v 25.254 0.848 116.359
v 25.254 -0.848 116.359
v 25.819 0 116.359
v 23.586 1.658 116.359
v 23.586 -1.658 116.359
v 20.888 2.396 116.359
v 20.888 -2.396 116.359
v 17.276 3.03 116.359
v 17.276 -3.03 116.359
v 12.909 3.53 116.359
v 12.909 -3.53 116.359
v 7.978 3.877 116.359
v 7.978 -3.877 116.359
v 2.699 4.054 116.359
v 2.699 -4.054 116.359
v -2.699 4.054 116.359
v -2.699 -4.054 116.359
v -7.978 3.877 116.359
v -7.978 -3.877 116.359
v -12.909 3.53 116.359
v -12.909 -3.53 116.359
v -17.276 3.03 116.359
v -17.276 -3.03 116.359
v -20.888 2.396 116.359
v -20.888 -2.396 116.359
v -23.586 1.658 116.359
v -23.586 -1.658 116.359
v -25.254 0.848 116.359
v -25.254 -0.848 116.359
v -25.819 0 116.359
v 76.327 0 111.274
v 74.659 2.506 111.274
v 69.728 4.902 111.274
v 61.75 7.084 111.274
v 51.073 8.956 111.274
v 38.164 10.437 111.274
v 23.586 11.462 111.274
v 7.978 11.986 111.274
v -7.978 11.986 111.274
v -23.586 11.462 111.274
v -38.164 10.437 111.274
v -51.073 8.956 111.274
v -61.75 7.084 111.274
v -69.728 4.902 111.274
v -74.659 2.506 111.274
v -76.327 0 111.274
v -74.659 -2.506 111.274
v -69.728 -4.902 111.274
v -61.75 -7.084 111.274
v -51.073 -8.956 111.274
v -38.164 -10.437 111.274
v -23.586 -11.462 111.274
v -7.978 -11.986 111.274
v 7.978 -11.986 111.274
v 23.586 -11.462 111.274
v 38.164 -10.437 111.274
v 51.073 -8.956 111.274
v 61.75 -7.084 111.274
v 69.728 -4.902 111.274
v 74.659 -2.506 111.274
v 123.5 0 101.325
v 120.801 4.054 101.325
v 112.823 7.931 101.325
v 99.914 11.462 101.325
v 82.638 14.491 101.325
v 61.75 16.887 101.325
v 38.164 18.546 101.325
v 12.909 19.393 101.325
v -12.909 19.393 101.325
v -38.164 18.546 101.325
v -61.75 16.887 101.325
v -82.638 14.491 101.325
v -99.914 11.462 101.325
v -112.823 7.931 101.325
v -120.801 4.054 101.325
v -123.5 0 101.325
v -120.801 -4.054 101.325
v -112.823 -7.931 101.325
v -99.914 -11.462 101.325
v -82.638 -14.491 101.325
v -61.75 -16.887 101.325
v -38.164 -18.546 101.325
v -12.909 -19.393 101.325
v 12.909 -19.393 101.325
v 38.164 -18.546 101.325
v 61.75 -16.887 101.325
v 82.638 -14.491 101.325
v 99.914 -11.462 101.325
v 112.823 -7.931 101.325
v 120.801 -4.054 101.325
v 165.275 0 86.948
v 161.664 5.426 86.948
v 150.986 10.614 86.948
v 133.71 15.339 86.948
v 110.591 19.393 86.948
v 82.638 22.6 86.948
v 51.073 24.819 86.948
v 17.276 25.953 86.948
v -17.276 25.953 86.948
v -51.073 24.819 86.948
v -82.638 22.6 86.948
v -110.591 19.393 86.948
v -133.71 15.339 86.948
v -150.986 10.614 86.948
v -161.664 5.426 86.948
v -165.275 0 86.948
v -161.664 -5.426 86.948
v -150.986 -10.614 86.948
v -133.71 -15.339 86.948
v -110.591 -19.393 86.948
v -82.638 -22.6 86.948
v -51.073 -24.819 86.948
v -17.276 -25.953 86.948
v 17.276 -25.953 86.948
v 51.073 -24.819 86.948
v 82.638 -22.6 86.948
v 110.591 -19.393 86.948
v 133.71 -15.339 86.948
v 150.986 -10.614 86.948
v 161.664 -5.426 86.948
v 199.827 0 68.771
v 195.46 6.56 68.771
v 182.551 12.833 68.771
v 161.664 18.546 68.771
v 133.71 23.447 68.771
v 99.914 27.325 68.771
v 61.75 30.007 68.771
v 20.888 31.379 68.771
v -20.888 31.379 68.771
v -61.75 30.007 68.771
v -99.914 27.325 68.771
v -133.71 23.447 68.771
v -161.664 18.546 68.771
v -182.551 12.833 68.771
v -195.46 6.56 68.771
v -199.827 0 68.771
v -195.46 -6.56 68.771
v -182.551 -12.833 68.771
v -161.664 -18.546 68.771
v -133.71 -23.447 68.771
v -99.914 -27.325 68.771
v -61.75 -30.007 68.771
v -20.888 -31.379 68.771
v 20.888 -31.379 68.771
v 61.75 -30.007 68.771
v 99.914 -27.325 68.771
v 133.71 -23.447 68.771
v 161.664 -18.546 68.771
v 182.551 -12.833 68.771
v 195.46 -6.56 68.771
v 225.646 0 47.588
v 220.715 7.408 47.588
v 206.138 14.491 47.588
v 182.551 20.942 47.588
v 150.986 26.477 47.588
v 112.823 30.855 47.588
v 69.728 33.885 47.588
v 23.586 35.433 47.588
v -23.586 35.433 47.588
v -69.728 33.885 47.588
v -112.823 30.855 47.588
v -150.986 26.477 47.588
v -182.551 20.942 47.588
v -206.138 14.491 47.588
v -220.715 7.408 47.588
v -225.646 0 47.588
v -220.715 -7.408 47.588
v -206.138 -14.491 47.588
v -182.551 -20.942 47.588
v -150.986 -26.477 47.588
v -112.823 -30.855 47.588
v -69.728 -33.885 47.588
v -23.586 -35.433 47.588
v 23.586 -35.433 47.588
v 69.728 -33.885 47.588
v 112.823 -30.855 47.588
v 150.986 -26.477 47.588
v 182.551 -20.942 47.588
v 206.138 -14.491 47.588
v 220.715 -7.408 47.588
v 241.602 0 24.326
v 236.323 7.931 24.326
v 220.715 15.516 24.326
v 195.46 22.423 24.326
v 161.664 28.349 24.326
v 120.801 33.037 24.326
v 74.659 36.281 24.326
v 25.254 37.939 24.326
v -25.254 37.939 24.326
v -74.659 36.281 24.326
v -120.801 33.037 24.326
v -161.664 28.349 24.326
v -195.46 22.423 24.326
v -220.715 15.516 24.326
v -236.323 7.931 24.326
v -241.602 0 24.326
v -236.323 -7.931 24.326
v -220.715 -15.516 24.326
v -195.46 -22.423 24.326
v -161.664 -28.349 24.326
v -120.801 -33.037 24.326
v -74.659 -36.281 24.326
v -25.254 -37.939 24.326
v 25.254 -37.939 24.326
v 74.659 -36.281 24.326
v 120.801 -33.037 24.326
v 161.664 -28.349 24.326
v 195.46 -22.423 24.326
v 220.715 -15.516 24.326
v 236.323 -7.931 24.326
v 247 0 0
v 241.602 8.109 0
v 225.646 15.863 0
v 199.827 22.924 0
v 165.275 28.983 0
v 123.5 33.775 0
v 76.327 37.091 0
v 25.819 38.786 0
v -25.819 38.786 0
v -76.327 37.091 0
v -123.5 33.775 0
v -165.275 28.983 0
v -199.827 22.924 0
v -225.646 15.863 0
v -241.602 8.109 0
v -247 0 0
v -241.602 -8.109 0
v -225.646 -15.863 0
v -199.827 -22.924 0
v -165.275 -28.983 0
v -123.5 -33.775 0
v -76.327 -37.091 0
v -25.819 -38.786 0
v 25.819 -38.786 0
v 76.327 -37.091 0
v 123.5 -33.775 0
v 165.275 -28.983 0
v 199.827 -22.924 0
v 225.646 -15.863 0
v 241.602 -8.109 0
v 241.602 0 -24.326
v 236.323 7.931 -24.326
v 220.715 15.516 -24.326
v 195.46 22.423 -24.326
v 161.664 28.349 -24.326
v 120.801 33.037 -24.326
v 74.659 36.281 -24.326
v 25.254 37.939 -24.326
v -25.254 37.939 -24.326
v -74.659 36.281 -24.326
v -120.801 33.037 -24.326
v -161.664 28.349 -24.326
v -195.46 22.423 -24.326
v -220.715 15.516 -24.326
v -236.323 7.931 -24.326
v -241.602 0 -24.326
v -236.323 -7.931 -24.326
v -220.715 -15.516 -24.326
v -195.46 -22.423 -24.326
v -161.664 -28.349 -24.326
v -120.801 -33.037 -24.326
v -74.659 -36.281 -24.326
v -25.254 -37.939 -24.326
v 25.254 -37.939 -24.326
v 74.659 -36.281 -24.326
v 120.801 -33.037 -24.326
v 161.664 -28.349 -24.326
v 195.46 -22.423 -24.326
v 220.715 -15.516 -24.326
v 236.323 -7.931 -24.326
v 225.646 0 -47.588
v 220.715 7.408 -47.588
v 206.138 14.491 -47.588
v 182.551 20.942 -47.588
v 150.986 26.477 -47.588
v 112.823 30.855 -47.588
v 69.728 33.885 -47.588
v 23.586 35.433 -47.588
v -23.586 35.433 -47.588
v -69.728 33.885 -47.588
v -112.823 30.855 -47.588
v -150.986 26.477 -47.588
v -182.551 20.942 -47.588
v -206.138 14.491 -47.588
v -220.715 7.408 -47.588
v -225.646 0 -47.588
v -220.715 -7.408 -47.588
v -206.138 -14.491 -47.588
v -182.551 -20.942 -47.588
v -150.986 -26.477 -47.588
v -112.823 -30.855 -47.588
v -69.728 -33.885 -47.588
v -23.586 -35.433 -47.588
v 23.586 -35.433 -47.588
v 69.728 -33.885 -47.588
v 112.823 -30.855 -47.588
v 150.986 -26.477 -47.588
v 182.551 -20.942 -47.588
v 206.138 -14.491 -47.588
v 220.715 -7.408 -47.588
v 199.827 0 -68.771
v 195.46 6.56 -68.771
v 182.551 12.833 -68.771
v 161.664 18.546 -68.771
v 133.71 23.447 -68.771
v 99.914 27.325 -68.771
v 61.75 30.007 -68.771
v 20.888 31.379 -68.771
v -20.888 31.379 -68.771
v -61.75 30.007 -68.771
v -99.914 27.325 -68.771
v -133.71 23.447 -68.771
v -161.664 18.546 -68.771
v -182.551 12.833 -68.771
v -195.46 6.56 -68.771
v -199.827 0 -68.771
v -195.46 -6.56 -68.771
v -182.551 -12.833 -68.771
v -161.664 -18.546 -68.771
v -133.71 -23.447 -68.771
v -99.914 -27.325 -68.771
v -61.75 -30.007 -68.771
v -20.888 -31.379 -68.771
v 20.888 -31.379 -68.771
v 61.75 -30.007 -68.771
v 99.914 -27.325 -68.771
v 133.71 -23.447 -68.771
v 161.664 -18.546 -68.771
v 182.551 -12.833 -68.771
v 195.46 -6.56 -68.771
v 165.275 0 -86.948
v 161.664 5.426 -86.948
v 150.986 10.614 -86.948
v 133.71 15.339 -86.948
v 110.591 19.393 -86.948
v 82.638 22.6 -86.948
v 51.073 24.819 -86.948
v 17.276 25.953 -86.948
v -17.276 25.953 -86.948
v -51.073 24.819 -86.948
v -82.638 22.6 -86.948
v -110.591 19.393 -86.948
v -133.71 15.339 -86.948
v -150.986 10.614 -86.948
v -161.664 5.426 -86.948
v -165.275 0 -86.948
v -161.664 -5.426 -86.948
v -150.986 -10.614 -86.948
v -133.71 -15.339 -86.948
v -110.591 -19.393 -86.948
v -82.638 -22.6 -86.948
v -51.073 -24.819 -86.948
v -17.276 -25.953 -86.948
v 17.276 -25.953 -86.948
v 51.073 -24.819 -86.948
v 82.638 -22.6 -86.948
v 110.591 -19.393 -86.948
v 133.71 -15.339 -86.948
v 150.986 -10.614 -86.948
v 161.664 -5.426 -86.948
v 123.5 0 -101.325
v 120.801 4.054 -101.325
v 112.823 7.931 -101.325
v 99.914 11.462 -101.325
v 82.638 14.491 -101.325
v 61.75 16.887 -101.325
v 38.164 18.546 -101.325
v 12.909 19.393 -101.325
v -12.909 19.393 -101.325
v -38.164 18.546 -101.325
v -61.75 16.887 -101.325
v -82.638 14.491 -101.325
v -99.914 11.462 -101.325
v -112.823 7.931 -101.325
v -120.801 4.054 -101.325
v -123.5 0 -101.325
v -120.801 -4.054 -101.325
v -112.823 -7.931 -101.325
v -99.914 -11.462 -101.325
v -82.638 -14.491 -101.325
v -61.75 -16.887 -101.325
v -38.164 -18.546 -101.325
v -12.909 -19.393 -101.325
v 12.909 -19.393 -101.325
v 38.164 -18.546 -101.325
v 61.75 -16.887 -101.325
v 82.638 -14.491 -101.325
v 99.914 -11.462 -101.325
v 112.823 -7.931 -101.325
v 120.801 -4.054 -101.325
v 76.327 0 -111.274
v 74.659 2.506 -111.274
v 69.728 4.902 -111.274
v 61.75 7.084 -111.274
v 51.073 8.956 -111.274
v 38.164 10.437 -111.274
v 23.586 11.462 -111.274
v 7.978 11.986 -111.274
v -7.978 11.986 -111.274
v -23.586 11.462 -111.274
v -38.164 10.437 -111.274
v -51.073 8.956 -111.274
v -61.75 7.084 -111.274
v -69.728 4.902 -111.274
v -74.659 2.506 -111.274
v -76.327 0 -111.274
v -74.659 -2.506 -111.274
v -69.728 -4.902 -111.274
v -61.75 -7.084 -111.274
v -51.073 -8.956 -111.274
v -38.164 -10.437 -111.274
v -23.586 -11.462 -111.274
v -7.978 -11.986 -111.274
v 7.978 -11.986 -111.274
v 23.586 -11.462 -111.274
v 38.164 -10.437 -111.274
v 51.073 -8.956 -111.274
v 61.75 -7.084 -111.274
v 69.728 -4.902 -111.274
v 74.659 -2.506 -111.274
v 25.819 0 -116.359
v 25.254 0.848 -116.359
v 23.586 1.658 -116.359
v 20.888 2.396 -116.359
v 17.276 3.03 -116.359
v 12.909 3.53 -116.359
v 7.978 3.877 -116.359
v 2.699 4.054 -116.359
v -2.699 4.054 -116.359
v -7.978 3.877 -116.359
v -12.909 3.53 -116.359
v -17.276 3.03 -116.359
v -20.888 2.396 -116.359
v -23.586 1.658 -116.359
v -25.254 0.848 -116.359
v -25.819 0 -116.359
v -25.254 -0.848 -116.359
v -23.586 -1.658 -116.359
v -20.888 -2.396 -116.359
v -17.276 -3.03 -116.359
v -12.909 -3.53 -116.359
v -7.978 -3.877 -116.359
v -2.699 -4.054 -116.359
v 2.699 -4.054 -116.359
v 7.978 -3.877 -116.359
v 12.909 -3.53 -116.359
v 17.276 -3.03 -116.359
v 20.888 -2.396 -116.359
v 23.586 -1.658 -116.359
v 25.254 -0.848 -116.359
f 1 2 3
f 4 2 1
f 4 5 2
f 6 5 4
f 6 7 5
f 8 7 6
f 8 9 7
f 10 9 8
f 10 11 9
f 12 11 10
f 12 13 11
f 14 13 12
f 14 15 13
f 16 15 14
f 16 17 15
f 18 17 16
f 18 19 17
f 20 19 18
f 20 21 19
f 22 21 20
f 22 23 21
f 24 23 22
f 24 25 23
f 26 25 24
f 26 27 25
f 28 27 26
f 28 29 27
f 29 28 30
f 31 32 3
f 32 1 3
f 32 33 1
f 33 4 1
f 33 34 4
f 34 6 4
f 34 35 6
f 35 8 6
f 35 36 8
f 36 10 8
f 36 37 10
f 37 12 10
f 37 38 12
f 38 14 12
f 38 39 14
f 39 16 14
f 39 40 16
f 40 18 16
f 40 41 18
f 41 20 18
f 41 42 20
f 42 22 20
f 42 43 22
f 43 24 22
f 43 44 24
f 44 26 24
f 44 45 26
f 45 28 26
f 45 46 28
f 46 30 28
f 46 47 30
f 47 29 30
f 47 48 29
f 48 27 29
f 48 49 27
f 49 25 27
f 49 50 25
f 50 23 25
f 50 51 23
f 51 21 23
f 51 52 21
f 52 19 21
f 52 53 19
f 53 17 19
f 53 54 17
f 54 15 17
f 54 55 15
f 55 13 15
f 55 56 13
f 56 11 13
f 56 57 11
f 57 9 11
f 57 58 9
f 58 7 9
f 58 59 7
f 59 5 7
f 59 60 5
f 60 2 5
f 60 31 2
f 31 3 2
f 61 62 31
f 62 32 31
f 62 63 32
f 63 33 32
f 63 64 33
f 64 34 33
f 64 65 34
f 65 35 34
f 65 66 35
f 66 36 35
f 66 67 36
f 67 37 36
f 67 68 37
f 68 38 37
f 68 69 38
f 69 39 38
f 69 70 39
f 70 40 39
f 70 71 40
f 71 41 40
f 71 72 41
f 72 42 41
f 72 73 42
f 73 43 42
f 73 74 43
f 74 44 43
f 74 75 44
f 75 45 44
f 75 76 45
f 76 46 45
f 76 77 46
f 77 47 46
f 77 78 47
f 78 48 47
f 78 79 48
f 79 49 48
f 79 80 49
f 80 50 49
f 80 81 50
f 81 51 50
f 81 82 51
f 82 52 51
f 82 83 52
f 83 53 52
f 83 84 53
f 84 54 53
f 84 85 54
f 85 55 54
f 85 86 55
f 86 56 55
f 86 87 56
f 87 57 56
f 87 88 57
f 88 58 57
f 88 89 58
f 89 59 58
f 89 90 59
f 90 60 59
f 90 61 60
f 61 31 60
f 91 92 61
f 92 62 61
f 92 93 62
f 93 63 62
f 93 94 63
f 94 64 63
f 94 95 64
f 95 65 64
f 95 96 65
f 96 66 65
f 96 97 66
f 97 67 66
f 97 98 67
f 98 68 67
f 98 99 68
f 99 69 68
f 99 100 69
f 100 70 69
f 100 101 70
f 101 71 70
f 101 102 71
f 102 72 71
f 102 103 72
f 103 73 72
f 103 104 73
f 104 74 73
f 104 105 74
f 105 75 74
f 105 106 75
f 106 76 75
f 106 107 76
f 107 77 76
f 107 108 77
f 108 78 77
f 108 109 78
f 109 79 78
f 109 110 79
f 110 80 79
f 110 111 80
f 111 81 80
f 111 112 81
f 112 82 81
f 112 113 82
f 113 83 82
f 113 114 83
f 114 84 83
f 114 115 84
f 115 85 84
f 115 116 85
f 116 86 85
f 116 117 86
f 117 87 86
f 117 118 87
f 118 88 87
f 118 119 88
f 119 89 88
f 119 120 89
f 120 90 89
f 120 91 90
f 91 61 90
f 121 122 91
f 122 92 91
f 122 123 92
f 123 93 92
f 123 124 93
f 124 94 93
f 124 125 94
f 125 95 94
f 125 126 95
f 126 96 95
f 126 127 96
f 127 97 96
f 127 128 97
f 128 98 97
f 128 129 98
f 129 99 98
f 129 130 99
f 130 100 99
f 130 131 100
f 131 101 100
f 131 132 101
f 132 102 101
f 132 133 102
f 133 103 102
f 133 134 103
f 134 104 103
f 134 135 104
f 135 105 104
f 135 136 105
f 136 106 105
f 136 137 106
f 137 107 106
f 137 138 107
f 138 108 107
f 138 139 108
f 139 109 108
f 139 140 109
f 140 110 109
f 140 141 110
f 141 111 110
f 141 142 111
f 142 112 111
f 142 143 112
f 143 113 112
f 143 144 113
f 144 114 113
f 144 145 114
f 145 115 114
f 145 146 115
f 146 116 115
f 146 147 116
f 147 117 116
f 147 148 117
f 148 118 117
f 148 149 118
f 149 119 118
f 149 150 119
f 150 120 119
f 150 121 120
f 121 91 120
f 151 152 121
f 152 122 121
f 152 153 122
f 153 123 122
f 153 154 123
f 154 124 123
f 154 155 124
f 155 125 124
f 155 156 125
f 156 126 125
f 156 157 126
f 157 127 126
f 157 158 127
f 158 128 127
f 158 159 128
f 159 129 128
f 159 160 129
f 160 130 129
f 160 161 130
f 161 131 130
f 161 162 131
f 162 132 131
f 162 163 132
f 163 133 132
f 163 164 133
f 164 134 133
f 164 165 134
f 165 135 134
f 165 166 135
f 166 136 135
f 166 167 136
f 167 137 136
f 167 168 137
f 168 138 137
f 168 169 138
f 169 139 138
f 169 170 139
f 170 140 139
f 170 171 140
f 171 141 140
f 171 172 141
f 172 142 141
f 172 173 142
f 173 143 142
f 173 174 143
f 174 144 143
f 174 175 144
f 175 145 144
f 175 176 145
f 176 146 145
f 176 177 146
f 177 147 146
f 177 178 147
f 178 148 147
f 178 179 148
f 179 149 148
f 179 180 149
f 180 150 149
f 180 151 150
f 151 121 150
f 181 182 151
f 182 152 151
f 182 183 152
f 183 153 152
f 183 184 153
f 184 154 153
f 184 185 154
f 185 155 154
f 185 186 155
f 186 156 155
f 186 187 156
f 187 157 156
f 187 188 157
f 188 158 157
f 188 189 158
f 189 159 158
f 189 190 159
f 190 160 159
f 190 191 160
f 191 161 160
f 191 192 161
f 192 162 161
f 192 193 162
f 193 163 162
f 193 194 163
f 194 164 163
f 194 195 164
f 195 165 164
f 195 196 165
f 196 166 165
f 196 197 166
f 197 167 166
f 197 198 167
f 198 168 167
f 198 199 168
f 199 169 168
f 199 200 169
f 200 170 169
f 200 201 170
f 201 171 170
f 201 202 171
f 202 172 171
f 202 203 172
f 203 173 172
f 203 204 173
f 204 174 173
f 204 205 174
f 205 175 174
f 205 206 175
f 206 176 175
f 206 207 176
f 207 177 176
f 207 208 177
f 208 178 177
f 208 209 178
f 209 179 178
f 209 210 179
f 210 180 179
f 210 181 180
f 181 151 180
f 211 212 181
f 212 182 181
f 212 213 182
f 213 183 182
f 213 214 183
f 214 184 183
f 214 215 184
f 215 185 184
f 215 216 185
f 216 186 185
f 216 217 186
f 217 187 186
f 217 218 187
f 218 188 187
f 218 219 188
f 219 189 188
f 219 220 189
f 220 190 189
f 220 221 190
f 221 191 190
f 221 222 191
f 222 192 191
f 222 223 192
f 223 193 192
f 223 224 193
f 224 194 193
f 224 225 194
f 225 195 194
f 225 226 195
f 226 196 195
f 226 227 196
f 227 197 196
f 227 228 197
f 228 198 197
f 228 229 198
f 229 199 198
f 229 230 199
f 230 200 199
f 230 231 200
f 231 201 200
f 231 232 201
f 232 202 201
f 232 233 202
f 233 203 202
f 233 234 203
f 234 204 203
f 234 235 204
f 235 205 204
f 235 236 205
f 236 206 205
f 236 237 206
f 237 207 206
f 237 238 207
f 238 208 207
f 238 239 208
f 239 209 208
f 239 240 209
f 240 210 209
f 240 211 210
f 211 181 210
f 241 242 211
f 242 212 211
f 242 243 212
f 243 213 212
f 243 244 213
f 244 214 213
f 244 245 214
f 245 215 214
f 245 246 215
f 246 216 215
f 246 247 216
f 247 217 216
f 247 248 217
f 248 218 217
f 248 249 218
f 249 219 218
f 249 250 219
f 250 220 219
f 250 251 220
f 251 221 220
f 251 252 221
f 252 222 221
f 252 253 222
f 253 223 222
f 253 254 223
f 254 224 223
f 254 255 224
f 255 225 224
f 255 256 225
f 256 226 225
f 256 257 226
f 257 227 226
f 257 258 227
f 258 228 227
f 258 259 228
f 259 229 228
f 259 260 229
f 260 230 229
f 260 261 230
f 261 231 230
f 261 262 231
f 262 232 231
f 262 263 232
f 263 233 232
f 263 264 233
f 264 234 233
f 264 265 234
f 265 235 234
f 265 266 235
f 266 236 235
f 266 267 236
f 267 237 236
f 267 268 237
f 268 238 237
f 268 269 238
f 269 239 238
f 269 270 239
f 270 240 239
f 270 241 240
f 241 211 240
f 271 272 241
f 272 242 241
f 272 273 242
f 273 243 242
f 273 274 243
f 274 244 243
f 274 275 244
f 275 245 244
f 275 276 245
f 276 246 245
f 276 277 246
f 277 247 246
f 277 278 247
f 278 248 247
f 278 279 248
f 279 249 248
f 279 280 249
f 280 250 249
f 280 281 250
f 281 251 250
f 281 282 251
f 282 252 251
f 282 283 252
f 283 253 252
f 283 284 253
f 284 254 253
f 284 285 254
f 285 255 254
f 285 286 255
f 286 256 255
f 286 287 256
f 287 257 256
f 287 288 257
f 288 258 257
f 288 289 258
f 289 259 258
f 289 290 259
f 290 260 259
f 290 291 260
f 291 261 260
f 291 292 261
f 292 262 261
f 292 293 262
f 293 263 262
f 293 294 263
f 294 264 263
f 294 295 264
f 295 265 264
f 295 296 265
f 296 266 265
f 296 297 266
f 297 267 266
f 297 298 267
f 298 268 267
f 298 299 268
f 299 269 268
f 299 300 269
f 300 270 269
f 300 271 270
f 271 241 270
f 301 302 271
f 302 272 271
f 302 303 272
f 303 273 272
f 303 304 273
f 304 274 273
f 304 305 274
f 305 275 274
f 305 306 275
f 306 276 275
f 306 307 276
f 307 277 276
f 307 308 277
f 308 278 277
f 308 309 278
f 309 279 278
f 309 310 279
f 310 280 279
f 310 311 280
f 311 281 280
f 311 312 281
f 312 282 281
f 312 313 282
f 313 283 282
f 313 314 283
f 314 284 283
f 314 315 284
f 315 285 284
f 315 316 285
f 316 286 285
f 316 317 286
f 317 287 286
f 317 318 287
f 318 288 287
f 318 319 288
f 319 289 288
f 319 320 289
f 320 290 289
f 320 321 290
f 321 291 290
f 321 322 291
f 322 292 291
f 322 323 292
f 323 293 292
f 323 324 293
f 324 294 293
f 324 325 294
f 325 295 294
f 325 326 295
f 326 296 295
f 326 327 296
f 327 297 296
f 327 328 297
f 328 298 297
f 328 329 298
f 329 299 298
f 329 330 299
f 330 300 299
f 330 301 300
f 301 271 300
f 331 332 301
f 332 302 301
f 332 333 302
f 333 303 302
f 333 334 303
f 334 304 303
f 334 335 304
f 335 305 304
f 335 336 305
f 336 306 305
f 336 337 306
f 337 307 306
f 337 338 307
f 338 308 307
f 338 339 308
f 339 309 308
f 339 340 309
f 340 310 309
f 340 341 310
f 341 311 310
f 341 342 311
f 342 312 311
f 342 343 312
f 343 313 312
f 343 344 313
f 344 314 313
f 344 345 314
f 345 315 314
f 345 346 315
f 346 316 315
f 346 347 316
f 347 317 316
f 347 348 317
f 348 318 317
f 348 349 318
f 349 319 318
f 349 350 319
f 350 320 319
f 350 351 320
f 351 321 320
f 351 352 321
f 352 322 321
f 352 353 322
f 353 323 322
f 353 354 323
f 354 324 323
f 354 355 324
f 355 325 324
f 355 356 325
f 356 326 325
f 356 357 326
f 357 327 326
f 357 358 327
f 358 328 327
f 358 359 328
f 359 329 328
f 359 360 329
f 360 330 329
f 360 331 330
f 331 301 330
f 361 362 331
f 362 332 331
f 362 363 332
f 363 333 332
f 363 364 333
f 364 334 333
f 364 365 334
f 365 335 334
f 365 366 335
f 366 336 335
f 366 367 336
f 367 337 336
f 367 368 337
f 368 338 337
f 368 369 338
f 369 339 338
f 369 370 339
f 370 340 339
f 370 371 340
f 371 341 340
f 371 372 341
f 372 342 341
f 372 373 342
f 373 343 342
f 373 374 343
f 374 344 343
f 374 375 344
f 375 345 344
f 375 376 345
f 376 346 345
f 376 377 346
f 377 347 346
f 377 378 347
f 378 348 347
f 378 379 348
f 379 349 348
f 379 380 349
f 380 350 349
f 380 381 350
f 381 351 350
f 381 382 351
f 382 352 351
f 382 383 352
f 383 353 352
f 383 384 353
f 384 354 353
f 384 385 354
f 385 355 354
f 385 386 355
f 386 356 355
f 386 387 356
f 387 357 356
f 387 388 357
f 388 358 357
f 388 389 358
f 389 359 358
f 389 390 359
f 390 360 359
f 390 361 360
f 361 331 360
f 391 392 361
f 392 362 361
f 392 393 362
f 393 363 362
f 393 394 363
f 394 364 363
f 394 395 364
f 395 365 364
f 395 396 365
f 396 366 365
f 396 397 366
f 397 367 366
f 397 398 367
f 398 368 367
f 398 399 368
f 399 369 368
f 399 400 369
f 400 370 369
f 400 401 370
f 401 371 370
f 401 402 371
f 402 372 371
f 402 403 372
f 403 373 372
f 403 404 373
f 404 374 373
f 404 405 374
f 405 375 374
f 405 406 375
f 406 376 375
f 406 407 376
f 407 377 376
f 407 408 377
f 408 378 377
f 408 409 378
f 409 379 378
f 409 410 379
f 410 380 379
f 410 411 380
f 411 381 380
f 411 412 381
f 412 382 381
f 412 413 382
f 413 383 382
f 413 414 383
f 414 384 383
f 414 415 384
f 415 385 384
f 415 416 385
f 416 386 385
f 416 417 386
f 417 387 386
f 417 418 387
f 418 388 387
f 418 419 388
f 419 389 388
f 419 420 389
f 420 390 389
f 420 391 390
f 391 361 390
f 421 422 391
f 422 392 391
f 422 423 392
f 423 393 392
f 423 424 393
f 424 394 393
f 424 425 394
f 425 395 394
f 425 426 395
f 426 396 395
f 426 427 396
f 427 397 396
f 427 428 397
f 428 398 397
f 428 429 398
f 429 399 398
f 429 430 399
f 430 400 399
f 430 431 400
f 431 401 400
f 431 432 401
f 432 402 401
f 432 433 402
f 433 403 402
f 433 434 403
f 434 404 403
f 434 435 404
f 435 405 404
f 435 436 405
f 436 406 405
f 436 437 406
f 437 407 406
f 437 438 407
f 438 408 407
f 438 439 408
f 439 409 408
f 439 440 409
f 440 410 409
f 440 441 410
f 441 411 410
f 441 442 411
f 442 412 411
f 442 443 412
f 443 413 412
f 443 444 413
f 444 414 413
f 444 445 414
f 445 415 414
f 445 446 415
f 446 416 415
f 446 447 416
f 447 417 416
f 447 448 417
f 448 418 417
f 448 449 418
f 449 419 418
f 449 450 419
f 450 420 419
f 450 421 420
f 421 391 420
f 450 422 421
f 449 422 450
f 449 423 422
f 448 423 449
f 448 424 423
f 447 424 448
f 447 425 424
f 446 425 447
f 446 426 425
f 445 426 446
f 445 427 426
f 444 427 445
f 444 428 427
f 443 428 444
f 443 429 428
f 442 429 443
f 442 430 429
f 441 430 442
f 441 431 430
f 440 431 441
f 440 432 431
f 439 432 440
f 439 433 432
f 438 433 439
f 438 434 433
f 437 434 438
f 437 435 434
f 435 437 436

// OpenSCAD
// Generated by SolidPython 1.0.1 on 2020-07-29 00:46:53


scale(v = [19, 3, 9]) {
	sphere(r = 13);
}
/***********************************************
*********      SolidPython code:      **********
************************************************
 
# import packages: SolidPython
from solid import *
from solid.utils import *
from itertools import chain, combinations, permutations


class Resize:

    def __init__(self, scad_file):
        self.scad_file = scad_file
        #self.scad_file = import_scad(scad_file)
        # cone/cylinder param:
        self.r1 = 0
        self.r2 = 0
        self.h = 0
        # rectangular prism param:
        self.w = 0
        self.l = 0
        # ellipse param:
        self.r = 0

    # import OpenScad code (file name corresponds to shape)


    # classify shape + parameters
    def assign(self, param1, param2, param3):
        if self.scad_file == 'cone.scad':
            self.r1 = param1
            self.r2 = param2
            self.h = param3
        elif self.scad_file == 'cylinder.scad':
            self.r1 = param1
            self.r2 = param2
            self.h = param3
        elif self.scad_file == 'rectangularPrism.scad':
            self.h = param1
            self.l = param2
            self.w = param3
        else:
            self.r = param1
            self.h = param2

    # resize parameters
    def iterate(self):
        x = range(3, 20, 2)
        i = 1
        if self.scad_file == 'cone.scad':
            tempList = list(permutations(x, 2))
            for temp in tempList:
                param1 = temp[0]
                param2 = temp[1]
                filepath = 'produced_scad_files/' + 'cone' + str(param1) + '_' + str(param2) + '_' + '.scad'
                scad_render_to_file(cylinder(h=param1, r1=param2, r2=0), filepath)

        elif self.scad_file == 'cylinder.scad':
            tempList = list(permutations(x, 3))
            for temp in tempList:
                param1 = temp[0]
                param2 = temp[1]
                filepath = 'produced_scad_files/' + 'cylinder' + str(param1) + '_' + str(param2) + '_' + '.scad'
                scad_render_to_file(cylinder(h=param1, r1=param2, r2=param2), filepath)

        elif self.scad_file == 'rectangularPrism.scad':
            tempList = list(permutations(x, 3))
            for temp in tempList:
                param1 = temp[0]
                param2 = temp[1]
                param3 = temp[2]
                filepath = 'produced_scad_files/' + 'rectangularPrism' + str(param1) + '_' + str(param2) + '_' + str(
                    param3) + '.scad'
                scad_render_to_file(cube(size=(param1, param2, param3)), filepath)

        elif self.scad_file == 'ellipse.scad':
            tempList = list(permutations(x, 4))
            for temp in tempList:
                param1 = temp[0]
                param2 = temp[1]
                param3 = temp[2]
                param4 = temp[3]
                filepath = 'produced_scad_files/' + 'ellipse' + str(param1) + '_' + str(param2) + '_' + str(param3) + '_' + str(param4) + '.scad'
                scad_render_to_file(scale([param1, param2, param3])(sphere(r=param4)), filepath)

    def render_to_scadfile(self):
        scad_render_to_file(scad, 'example.scad') 
 
************************************************/
